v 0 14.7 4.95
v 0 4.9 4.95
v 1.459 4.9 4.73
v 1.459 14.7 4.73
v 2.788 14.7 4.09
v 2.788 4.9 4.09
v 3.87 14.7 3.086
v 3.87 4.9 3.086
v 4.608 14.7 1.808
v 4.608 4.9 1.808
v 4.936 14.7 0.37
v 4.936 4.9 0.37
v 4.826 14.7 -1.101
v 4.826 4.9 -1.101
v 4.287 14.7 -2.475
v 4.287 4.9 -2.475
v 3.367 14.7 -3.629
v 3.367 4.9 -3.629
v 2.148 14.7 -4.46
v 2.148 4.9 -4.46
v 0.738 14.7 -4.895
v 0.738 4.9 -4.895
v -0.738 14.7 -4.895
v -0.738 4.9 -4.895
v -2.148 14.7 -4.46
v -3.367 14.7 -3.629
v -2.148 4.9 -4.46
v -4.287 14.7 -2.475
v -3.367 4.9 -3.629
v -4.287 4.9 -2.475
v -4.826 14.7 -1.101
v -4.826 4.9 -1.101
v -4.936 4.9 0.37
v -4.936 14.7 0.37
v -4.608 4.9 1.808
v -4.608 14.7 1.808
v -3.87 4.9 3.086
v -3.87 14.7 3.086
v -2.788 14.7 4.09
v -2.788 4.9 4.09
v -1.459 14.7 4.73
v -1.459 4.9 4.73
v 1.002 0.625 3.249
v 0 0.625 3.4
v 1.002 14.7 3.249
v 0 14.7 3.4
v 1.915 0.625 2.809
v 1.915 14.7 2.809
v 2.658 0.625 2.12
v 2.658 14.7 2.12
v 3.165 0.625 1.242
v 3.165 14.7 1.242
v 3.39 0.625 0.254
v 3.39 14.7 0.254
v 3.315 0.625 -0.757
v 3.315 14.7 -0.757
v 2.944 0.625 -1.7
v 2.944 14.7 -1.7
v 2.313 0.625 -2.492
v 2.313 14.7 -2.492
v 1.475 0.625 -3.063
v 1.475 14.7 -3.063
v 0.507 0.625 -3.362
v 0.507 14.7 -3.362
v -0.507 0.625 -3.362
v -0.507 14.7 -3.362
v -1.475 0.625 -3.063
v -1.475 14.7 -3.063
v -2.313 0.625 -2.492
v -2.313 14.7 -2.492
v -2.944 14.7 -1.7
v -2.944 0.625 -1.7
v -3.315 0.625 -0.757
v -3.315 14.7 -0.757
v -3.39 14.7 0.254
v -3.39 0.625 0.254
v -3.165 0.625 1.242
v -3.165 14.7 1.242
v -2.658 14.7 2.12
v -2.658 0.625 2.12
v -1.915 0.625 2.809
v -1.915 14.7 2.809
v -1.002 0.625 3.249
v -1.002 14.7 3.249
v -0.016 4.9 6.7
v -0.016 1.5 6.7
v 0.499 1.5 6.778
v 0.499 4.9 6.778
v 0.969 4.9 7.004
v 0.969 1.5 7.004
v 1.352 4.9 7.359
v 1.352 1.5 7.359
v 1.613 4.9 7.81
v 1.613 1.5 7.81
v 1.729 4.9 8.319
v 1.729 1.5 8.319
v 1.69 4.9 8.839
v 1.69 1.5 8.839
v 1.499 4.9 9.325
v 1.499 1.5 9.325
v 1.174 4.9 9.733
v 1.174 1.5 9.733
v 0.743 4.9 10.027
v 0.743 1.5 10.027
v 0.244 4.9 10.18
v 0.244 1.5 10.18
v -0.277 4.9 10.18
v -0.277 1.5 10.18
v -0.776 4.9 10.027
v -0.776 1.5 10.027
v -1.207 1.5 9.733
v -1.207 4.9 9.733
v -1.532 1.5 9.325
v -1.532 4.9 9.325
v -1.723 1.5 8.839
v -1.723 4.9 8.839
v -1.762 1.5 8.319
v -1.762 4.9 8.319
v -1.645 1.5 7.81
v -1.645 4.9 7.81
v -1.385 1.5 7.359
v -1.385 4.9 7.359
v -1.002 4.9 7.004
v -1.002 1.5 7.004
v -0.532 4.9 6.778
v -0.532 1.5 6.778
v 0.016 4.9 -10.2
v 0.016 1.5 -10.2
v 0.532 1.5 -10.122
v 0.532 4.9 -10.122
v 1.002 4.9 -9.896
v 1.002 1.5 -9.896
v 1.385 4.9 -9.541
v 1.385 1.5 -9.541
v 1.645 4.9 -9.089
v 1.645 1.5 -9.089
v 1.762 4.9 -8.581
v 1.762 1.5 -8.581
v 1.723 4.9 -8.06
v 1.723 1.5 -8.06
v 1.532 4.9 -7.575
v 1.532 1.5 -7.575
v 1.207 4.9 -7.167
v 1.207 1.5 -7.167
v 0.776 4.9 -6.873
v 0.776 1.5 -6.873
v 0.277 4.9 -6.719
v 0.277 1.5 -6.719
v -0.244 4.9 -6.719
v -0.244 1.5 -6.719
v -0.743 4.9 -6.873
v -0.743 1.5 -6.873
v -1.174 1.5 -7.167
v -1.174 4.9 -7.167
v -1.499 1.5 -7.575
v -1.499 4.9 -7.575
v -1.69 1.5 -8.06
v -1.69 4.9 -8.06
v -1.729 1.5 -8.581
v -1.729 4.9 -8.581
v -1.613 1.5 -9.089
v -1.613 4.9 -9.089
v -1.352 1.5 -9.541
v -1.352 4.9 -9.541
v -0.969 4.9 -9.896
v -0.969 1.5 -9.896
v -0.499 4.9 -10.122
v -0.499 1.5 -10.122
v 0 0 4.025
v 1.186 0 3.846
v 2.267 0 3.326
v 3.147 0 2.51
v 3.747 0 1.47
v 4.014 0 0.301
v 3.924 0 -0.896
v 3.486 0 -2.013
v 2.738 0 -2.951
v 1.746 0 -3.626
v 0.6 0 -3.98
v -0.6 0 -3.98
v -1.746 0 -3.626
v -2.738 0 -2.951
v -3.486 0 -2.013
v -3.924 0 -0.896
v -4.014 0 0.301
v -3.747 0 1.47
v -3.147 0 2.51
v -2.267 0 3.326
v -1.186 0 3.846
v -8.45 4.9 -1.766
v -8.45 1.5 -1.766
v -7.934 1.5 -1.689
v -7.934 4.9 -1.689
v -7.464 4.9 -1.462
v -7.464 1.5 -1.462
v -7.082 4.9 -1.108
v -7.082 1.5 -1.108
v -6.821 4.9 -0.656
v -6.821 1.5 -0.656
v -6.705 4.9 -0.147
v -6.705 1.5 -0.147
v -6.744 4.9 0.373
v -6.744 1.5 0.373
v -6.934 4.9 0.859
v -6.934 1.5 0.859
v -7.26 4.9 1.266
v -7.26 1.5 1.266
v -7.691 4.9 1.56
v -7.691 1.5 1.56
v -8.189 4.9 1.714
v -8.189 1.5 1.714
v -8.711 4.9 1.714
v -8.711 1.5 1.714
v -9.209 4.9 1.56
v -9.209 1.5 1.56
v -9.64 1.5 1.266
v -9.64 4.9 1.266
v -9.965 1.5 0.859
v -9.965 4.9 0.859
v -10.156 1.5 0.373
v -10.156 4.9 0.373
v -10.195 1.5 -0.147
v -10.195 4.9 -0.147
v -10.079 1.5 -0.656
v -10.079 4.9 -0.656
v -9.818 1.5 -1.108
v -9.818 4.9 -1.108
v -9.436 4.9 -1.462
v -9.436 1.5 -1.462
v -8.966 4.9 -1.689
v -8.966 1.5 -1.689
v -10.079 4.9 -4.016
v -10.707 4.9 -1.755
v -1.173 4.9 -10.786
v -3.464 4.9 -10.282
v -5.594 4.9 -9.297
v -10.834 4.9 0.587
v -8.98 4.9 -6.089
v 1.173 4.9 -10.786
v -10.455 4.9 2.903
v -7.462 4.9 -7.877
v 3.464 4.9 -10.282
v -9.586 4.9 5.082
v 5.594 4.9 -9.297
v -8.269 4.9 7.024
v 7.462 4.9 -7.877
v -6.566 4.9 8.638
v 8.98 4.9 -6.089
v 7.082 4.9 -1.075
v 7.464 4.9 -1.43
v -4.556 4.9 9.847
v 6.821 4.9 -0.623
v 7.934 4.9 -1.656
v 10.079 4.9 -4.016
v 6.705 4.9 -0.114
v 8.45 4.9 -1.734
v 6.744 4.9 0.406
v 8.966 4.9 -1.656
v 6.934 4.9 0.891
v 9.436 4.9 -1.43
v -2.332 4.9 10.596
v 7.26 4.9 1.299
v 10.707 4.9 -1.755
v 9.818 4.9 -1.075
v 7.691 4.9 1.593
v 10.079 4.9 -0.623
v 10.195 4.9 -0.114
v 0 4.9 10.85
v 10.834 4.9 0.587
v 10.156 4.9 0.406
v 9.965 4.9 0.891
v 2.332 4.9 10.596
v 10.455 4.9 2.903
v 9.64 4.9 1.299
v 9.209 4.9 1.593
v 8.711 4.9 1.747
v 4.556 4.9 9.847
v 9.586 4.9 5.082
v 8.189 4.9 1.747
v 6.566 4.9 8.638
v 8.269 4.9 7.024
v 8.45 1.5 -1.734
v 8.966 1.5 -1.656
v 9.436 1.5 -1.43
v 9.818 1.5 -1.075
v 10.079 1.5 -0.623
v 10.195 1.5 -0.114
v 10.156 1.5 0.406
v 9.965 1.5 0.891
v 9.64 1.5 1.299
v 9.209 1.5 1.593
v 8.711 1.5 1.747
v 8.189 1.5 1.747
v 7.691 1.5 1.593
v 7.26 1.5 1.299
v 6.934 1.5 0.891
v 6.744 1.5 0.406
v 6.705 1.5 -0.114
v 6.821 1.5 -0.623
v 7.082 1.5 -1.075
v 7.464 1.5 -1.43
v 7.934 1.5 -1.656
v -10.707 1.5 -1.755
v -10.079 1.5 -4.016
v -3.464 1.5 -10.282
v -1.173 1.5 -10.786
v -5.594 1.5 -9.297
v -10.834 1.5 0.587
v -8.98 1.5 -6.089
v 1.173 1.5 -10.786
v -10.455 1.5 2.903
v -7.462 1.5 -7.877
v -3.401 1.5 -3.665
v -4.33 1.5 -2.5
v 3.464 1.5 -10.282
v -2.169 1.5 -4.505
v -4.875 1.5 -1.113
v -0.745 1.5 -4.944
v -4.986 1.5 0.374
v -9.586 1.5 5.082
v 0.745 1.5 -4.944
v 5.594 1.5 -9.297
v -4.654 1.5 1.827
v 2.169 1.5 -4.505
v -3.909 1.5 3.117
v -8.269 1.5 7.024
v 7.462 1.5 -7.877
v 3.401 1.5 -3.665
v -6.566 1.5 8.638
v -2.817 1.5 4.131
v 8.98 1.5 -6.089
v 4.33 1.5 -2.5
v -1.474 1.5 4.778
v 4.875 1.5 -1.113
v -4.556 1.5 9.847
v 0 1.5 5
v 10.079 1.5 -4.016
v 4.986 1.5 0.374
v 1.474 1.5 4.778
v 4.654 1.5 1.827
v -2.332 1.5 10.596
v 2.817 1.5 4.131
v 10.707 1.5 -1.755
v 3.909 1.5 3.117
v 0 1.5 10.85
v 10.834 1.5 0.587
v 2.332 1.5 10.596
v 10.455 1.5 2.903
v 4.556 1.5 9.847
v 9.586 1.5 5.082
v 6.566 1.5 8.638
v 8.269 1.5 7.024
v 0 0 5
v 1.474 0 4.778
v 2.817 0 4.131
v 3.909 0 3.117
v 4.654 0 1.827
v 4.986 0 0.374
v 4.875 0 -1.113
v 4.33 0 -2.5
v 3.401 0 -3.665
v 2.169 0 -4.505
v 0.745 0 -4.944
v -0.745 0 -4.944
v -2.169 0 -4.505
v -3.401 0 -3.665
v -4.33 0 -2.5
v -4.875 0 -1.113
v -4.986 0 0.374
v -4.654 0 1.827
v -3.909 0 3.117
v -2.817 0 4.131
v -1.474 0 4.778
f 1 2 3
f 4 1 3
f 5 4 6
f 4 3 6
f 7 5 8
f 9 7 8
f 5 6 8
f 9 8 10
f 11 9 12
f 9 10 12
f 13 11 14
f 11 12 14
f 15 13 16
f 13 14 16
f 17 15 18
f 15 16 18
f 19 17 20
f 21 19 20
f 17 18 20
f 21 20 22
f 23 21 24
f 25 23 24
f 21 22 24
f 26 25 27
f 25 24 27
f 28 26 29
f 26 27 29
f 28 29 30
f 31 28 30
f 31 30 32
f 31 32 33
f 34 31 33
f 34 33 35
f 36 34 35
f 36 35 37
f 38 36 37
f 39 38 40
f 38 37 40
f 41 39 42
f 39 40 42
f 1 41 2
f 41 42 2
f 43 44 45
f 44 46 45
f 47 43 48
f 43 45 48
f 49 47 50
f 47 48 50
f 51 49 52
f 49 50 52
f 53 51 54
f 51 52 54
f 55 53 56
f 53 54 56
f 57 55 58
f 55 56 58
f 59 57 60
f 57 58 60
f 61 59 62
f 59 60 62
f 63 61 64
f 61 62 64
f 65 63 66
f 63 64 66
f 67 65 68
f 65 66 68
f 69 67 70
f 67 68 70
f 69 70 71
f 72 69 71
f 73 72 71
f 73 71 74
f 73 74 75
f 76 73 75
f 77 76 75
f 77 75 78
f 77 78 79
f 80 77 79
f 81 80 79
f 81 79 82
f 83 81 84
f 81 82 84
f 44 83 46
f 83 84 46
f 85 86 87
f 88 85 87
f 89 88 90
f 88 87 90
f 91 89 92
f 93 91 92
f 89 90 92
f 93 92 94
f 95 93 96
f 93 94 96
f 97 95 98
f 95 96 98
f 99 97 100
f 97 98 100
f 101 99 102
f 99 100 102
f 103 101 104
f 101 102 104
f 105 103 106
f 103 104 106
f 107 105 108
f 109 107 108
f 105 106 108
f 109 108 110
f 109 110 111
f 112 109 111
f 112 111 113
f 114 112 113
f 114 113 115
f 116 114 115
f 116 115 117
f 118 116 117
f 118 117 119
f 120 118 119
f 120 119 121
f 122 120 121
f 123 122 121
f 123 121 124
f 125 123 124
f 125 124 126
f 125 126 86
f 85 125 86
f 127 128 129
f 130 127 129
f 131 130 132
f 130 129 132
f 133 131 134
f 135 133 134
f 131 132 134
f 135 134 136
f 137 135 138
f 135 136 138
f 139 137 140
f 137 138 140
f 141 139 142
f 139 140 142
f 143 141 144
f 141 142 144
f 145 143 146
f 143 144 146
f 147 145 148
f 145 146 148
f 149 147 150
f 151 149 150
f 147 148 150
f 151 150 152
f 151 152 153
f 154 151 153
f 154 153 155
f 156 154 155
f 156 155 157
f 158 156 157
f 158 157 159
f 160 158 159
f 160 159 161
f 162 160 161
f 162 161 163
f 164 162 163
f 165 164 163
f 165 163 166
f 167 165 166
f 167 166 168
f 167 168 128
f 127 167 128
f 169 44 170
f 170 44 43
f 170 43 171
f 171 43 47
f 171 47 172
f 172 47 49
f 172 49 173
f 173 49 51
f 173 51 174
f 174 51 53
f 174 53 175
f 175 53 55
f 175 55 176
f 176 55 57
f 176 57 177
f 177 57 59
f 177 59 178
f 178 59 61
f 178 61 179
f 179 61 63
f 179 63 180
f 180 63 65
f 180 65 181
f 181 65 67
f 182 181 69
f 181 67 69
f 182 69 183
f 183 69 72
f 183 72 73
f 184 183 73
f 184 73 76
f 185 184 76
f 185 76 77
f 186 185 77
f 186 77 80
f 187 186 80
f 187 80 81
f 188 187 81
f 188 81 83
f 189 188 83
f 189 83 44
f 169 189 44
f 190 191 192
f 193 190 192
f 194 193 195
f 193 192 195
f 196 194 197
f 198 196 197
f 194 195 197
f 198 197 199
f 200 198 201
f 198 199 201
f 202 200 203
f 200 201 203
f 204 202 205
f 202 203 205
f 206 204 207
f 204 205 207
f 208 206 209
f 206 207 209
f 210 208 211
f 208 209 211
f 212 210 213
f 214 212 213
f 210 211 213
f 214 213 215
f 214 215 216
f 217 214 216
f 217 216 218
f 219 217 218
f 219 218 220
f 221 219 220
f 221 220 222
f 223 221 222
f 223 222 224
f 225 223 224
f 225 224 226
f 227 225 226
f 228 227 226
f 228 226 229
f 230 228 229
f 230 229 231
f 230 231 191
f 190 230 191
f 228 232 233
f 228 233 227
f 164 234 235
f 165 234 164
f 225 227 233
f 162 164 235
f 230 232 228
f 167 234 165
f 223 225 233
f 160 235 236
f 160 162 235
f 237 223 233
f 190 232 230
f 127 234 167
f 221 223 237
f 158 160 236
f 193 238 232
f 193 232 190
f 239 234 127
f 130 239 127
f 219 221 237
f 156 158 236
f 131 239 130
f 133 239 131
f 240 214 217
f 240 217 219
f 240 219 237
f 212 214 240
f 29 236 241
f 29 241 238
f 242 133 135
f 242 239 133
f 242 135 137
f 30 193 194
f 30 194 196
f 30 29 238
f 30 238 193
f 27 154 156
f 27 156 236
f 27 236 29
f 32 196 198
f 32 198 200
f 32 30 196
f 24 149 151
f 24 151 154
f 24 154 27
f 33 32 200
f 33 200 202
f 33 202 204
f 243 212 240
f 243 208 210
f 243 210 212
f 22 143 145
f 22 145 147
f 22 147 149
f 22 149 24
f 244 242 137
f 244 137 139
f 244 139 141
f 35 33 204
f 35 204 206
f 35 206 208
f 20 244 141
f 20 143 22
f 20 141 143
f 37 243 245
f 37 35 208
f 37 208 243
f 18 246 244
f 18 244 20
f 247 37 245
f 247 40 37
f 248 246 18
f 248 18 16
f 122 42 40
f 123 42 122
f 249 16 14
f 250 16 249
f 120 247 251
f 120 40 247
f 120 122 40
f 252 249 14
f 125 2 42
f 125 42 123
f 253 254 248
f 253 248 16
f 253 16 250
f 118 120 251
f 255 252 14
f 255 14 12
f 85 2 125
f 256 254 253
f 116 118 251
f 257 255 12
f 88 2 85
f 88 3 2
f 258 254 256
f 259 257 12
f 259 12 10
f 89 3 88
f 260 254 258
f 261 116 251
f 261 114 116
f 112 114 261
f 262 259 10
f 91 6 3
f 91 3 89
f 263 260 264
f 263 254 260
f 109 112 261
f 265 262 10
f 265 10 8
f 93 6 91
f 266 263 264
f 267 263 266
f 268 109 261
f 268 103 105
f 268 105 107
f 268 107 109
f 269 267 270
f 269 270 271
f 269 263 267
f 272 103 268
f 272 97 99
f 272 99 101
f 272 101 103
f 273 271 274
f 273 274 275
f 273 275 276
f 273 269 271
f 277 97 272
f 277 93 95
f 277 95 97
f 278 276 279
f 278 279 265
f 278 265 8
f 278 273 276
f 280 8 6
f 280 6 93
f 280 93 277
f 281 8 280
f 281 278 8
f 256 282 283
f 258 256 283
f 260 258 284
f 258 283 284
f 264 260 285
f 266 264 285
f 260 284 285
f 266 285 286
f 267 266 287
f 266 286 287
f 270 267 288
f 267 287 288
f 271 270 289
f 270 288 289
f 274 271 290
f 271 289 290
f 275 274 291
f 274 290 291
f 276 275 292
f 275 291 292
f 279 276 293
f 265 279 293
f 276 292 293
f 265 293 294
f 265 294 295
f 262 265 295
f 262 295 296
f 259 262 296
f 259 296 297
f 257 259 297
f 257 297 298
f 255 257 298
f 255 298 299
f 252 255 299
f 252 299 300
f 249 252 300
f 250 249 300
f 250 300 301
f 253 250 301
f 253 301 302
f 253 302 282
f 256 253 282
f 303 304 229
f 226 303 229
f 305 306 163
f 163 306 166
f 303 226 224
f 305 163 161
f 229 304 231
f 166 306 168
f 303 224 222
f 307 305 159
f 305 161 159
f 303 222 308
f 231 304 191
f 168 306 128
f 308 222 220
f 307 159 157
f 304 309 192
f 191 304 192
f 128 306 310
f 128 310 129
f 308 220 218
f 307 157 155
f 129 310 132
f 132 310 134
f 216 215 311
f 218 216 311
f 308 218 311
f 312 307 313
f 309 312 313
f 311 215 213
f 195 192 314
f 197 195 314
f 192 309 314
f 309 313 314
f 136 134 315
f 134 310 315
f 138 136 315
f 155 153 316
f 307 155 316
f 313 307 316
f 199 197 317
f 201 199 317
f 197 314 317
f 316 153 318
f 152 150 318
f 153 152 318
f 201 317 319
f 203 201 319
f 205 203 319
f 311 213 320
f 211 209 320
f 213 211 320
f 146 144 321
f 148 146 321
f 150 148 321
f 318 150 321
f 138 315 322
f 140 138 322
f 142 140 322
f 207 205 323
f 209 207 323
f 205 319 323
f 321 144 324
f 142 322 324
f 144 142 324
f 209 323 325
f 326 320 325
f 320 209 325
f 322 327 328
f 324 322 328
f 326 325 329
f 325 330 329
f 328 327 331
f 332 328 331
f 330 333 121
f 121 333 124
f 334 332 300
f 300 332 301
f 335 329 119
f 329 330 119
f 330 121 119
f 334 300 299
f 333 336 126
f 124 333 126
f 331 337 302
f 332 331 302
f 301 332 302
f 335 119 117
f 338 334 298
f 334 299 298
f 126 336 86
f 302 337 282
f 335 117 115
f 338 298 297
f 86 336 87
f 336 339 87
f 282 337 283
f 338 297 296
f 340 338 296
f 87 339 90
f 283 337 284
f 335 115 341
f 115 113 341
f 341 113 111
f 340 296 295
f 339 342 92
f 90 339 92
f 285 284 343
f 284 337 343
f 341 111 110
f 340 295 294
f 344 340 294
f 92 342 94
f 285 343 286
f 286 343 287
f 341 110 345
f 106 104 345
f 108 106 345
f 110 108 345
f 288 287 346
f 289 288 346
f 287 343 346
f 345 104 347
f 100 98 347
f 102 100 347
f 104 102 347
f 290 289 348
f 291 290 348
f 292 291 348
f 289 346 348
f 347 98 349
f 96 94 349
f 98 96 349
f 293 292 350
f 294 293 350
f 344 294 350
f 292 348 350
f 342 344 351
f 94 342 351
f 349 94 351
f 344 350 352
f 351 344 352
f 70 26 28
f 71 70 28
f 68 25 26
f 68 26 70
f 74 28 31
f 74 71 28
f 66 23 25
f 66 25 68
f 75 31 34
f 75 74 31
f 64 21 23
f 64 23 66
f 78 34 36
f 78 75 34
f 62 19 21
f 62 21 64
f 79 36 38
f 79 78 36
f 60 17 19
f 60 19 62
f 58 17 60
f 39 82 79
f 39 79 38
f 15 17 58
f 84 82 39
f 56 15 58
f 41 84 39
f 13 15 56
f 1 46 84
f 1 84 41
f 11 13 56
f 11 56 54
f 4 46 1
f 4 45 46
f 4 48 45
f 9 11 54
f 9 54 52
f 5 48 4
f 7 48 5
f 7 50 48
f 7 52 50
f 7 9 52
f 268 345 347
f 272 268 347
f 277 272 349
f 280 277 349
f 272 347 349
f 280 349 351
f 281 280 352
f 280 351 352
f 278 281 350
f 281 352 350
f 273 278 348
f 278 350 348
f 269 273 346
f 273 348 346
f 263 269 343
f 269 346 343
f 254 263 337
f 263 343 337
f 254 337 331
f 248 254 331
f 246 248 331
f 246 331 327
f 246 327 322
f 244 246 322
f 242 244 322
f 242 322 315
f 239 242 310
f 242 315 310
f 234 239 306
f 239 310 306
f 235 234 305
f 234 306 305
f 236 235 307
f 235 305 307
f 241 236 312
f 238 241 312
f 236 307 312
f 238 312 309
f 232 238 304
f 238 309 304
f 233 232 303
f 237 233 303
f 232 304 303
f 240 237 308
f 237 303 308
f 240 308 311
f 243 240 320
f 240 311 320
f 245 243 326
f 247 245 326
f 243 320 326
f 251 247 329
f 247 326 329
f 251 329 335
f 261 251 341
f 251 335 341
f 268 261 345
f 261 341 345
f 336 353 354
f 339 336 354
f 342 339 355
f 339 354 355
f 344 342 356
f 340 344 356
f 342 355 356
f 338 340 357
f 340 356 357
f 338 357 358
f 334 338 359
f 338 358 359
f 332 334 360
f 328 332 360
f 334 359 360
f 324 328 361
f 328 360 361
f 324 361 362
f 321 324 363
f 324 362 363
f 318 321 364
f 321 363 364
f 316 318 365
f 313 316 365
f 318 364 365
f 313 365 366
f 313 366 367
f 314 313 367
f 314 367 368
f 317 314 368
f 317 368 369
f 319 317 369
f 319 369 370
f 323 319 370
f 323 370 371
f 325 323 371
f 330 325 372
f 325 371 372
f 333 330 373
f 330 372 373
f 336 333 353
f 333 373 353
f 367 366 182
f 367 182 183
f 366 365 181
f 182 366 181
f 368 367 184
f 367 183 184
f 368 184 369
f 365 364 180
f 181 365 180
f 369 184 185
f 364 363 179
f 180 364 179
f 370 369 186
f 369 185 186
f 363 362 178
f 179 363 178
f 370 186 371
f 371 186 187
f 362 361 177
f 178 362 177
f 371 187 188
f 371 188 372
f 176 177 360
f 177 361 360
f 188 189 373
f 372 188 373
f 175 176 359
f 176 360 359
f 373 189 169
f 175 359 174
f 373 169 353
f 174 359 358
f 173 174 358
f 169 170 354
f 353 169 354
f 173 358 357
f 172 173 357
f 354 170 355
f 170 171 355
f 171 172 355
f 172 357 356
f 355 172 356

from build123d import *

# Parameters (mm, degrees)
SKETCH1_R                   = 5
BOSS_EXTRUDE1_DEPTH         = 1.5
SKETCH2_R                   = 10.85
BOSS_EXTRUDE2_DEPTH         = 3.4
SKETCH3_R                   = 4.95
BOSS_EXTRUDE3_DEPTH         = 9.8
M8_TAPPED_HOLE1_D           = 6.8
M8_TAPPED_HOLE1_CSINK_D     = 8.05
M8_TAPPED_HOLE1_CSINK_ANGLE = 90
SKETCH6_R                   = 1.75
CUT_EXTRUDE1_DEPTH          = 21.240676866


with BuildPart() as part:
    # Sketch1 → Boss-Extrude1 (new body)
    with BuildSketch(Plane(origin=(0, 0, 0), x_dir=(1, 0, 0), z_dir=(0, 1, 0))):
        with Locations(Location((0, 0, 0), (0, 0, 270))):
            Circle(SKETCH1_R)
    extrude(amount=BOSS_EXTRUDE1_DEPTH)

    # Sketch2 → Boss-Extrude2 (add)
    with BuildSketch(Plane(origin=(0, 1.5, 0), x_dir=(1, 0, 0), z_dir=(0, 1, 0))):
        with Locations(Location((0, 0, 0), (0, 0, 270))):
            Circle(SKETCH2_R)
    extrude(amount=BOSS_EXTRUDE2_DEPTH)

    # Sketch3 → Boss-Extrude3 (add)
    with BuildSketch(Plane(origin=(0, 4.9, 0), x_dir=(1, 0, 0), z_dir=(0, 1, 0))):
        with Locations(Location((0, 0, 0), (0, 0, 270))):
            Circle(SKETCH3_R)
    extrude(amount=BOSS_EXTRUDE3_DEPTH)

    # M8 Tapped Hole1 (through all)
    with Locations(Plane(origin=(0, 0, 0), x_dir=(0, 0, -1), z_dir=(0, -1, 0))):
        with Locations((0, 0)):
            CounterSinkHole(M8_TAPPED_HOLE1_D / 2, M8_TAPPED_HOLE1_CSINK_D / 2, counter_sink_angle=M8_TAPPED_HOLE1_CSINK_ANGLE)

    # Sketch6 → Cut-Extrude1 (cut, through all)
    with BuildSketch(Plane.XZ.offset(-1.5)):
        with Locations(Location((-0.016416422, 8.449812512, 0), (0, 0, 270))):
            Circle(SKETCH6_R)
        with Locations(Location((8.449812512, 0.016416422, 0), (0, 0, 270))):
            Circle(SKETCH6_R)
        with Locations(Location((0.016416422, -8.449812512, 0), (0, 0, 270))):
            Circle(SKETCH6_R)
        with Locations(Location((-8.449812512, -0.016416422, 0), (0, 0, 270))):
            Circle(SKETCH6_R)
    extrude(amount=-CUT_EXTRUDE1_DEPTH, mode=Mode.SUBTRACT)


solid = part.part
